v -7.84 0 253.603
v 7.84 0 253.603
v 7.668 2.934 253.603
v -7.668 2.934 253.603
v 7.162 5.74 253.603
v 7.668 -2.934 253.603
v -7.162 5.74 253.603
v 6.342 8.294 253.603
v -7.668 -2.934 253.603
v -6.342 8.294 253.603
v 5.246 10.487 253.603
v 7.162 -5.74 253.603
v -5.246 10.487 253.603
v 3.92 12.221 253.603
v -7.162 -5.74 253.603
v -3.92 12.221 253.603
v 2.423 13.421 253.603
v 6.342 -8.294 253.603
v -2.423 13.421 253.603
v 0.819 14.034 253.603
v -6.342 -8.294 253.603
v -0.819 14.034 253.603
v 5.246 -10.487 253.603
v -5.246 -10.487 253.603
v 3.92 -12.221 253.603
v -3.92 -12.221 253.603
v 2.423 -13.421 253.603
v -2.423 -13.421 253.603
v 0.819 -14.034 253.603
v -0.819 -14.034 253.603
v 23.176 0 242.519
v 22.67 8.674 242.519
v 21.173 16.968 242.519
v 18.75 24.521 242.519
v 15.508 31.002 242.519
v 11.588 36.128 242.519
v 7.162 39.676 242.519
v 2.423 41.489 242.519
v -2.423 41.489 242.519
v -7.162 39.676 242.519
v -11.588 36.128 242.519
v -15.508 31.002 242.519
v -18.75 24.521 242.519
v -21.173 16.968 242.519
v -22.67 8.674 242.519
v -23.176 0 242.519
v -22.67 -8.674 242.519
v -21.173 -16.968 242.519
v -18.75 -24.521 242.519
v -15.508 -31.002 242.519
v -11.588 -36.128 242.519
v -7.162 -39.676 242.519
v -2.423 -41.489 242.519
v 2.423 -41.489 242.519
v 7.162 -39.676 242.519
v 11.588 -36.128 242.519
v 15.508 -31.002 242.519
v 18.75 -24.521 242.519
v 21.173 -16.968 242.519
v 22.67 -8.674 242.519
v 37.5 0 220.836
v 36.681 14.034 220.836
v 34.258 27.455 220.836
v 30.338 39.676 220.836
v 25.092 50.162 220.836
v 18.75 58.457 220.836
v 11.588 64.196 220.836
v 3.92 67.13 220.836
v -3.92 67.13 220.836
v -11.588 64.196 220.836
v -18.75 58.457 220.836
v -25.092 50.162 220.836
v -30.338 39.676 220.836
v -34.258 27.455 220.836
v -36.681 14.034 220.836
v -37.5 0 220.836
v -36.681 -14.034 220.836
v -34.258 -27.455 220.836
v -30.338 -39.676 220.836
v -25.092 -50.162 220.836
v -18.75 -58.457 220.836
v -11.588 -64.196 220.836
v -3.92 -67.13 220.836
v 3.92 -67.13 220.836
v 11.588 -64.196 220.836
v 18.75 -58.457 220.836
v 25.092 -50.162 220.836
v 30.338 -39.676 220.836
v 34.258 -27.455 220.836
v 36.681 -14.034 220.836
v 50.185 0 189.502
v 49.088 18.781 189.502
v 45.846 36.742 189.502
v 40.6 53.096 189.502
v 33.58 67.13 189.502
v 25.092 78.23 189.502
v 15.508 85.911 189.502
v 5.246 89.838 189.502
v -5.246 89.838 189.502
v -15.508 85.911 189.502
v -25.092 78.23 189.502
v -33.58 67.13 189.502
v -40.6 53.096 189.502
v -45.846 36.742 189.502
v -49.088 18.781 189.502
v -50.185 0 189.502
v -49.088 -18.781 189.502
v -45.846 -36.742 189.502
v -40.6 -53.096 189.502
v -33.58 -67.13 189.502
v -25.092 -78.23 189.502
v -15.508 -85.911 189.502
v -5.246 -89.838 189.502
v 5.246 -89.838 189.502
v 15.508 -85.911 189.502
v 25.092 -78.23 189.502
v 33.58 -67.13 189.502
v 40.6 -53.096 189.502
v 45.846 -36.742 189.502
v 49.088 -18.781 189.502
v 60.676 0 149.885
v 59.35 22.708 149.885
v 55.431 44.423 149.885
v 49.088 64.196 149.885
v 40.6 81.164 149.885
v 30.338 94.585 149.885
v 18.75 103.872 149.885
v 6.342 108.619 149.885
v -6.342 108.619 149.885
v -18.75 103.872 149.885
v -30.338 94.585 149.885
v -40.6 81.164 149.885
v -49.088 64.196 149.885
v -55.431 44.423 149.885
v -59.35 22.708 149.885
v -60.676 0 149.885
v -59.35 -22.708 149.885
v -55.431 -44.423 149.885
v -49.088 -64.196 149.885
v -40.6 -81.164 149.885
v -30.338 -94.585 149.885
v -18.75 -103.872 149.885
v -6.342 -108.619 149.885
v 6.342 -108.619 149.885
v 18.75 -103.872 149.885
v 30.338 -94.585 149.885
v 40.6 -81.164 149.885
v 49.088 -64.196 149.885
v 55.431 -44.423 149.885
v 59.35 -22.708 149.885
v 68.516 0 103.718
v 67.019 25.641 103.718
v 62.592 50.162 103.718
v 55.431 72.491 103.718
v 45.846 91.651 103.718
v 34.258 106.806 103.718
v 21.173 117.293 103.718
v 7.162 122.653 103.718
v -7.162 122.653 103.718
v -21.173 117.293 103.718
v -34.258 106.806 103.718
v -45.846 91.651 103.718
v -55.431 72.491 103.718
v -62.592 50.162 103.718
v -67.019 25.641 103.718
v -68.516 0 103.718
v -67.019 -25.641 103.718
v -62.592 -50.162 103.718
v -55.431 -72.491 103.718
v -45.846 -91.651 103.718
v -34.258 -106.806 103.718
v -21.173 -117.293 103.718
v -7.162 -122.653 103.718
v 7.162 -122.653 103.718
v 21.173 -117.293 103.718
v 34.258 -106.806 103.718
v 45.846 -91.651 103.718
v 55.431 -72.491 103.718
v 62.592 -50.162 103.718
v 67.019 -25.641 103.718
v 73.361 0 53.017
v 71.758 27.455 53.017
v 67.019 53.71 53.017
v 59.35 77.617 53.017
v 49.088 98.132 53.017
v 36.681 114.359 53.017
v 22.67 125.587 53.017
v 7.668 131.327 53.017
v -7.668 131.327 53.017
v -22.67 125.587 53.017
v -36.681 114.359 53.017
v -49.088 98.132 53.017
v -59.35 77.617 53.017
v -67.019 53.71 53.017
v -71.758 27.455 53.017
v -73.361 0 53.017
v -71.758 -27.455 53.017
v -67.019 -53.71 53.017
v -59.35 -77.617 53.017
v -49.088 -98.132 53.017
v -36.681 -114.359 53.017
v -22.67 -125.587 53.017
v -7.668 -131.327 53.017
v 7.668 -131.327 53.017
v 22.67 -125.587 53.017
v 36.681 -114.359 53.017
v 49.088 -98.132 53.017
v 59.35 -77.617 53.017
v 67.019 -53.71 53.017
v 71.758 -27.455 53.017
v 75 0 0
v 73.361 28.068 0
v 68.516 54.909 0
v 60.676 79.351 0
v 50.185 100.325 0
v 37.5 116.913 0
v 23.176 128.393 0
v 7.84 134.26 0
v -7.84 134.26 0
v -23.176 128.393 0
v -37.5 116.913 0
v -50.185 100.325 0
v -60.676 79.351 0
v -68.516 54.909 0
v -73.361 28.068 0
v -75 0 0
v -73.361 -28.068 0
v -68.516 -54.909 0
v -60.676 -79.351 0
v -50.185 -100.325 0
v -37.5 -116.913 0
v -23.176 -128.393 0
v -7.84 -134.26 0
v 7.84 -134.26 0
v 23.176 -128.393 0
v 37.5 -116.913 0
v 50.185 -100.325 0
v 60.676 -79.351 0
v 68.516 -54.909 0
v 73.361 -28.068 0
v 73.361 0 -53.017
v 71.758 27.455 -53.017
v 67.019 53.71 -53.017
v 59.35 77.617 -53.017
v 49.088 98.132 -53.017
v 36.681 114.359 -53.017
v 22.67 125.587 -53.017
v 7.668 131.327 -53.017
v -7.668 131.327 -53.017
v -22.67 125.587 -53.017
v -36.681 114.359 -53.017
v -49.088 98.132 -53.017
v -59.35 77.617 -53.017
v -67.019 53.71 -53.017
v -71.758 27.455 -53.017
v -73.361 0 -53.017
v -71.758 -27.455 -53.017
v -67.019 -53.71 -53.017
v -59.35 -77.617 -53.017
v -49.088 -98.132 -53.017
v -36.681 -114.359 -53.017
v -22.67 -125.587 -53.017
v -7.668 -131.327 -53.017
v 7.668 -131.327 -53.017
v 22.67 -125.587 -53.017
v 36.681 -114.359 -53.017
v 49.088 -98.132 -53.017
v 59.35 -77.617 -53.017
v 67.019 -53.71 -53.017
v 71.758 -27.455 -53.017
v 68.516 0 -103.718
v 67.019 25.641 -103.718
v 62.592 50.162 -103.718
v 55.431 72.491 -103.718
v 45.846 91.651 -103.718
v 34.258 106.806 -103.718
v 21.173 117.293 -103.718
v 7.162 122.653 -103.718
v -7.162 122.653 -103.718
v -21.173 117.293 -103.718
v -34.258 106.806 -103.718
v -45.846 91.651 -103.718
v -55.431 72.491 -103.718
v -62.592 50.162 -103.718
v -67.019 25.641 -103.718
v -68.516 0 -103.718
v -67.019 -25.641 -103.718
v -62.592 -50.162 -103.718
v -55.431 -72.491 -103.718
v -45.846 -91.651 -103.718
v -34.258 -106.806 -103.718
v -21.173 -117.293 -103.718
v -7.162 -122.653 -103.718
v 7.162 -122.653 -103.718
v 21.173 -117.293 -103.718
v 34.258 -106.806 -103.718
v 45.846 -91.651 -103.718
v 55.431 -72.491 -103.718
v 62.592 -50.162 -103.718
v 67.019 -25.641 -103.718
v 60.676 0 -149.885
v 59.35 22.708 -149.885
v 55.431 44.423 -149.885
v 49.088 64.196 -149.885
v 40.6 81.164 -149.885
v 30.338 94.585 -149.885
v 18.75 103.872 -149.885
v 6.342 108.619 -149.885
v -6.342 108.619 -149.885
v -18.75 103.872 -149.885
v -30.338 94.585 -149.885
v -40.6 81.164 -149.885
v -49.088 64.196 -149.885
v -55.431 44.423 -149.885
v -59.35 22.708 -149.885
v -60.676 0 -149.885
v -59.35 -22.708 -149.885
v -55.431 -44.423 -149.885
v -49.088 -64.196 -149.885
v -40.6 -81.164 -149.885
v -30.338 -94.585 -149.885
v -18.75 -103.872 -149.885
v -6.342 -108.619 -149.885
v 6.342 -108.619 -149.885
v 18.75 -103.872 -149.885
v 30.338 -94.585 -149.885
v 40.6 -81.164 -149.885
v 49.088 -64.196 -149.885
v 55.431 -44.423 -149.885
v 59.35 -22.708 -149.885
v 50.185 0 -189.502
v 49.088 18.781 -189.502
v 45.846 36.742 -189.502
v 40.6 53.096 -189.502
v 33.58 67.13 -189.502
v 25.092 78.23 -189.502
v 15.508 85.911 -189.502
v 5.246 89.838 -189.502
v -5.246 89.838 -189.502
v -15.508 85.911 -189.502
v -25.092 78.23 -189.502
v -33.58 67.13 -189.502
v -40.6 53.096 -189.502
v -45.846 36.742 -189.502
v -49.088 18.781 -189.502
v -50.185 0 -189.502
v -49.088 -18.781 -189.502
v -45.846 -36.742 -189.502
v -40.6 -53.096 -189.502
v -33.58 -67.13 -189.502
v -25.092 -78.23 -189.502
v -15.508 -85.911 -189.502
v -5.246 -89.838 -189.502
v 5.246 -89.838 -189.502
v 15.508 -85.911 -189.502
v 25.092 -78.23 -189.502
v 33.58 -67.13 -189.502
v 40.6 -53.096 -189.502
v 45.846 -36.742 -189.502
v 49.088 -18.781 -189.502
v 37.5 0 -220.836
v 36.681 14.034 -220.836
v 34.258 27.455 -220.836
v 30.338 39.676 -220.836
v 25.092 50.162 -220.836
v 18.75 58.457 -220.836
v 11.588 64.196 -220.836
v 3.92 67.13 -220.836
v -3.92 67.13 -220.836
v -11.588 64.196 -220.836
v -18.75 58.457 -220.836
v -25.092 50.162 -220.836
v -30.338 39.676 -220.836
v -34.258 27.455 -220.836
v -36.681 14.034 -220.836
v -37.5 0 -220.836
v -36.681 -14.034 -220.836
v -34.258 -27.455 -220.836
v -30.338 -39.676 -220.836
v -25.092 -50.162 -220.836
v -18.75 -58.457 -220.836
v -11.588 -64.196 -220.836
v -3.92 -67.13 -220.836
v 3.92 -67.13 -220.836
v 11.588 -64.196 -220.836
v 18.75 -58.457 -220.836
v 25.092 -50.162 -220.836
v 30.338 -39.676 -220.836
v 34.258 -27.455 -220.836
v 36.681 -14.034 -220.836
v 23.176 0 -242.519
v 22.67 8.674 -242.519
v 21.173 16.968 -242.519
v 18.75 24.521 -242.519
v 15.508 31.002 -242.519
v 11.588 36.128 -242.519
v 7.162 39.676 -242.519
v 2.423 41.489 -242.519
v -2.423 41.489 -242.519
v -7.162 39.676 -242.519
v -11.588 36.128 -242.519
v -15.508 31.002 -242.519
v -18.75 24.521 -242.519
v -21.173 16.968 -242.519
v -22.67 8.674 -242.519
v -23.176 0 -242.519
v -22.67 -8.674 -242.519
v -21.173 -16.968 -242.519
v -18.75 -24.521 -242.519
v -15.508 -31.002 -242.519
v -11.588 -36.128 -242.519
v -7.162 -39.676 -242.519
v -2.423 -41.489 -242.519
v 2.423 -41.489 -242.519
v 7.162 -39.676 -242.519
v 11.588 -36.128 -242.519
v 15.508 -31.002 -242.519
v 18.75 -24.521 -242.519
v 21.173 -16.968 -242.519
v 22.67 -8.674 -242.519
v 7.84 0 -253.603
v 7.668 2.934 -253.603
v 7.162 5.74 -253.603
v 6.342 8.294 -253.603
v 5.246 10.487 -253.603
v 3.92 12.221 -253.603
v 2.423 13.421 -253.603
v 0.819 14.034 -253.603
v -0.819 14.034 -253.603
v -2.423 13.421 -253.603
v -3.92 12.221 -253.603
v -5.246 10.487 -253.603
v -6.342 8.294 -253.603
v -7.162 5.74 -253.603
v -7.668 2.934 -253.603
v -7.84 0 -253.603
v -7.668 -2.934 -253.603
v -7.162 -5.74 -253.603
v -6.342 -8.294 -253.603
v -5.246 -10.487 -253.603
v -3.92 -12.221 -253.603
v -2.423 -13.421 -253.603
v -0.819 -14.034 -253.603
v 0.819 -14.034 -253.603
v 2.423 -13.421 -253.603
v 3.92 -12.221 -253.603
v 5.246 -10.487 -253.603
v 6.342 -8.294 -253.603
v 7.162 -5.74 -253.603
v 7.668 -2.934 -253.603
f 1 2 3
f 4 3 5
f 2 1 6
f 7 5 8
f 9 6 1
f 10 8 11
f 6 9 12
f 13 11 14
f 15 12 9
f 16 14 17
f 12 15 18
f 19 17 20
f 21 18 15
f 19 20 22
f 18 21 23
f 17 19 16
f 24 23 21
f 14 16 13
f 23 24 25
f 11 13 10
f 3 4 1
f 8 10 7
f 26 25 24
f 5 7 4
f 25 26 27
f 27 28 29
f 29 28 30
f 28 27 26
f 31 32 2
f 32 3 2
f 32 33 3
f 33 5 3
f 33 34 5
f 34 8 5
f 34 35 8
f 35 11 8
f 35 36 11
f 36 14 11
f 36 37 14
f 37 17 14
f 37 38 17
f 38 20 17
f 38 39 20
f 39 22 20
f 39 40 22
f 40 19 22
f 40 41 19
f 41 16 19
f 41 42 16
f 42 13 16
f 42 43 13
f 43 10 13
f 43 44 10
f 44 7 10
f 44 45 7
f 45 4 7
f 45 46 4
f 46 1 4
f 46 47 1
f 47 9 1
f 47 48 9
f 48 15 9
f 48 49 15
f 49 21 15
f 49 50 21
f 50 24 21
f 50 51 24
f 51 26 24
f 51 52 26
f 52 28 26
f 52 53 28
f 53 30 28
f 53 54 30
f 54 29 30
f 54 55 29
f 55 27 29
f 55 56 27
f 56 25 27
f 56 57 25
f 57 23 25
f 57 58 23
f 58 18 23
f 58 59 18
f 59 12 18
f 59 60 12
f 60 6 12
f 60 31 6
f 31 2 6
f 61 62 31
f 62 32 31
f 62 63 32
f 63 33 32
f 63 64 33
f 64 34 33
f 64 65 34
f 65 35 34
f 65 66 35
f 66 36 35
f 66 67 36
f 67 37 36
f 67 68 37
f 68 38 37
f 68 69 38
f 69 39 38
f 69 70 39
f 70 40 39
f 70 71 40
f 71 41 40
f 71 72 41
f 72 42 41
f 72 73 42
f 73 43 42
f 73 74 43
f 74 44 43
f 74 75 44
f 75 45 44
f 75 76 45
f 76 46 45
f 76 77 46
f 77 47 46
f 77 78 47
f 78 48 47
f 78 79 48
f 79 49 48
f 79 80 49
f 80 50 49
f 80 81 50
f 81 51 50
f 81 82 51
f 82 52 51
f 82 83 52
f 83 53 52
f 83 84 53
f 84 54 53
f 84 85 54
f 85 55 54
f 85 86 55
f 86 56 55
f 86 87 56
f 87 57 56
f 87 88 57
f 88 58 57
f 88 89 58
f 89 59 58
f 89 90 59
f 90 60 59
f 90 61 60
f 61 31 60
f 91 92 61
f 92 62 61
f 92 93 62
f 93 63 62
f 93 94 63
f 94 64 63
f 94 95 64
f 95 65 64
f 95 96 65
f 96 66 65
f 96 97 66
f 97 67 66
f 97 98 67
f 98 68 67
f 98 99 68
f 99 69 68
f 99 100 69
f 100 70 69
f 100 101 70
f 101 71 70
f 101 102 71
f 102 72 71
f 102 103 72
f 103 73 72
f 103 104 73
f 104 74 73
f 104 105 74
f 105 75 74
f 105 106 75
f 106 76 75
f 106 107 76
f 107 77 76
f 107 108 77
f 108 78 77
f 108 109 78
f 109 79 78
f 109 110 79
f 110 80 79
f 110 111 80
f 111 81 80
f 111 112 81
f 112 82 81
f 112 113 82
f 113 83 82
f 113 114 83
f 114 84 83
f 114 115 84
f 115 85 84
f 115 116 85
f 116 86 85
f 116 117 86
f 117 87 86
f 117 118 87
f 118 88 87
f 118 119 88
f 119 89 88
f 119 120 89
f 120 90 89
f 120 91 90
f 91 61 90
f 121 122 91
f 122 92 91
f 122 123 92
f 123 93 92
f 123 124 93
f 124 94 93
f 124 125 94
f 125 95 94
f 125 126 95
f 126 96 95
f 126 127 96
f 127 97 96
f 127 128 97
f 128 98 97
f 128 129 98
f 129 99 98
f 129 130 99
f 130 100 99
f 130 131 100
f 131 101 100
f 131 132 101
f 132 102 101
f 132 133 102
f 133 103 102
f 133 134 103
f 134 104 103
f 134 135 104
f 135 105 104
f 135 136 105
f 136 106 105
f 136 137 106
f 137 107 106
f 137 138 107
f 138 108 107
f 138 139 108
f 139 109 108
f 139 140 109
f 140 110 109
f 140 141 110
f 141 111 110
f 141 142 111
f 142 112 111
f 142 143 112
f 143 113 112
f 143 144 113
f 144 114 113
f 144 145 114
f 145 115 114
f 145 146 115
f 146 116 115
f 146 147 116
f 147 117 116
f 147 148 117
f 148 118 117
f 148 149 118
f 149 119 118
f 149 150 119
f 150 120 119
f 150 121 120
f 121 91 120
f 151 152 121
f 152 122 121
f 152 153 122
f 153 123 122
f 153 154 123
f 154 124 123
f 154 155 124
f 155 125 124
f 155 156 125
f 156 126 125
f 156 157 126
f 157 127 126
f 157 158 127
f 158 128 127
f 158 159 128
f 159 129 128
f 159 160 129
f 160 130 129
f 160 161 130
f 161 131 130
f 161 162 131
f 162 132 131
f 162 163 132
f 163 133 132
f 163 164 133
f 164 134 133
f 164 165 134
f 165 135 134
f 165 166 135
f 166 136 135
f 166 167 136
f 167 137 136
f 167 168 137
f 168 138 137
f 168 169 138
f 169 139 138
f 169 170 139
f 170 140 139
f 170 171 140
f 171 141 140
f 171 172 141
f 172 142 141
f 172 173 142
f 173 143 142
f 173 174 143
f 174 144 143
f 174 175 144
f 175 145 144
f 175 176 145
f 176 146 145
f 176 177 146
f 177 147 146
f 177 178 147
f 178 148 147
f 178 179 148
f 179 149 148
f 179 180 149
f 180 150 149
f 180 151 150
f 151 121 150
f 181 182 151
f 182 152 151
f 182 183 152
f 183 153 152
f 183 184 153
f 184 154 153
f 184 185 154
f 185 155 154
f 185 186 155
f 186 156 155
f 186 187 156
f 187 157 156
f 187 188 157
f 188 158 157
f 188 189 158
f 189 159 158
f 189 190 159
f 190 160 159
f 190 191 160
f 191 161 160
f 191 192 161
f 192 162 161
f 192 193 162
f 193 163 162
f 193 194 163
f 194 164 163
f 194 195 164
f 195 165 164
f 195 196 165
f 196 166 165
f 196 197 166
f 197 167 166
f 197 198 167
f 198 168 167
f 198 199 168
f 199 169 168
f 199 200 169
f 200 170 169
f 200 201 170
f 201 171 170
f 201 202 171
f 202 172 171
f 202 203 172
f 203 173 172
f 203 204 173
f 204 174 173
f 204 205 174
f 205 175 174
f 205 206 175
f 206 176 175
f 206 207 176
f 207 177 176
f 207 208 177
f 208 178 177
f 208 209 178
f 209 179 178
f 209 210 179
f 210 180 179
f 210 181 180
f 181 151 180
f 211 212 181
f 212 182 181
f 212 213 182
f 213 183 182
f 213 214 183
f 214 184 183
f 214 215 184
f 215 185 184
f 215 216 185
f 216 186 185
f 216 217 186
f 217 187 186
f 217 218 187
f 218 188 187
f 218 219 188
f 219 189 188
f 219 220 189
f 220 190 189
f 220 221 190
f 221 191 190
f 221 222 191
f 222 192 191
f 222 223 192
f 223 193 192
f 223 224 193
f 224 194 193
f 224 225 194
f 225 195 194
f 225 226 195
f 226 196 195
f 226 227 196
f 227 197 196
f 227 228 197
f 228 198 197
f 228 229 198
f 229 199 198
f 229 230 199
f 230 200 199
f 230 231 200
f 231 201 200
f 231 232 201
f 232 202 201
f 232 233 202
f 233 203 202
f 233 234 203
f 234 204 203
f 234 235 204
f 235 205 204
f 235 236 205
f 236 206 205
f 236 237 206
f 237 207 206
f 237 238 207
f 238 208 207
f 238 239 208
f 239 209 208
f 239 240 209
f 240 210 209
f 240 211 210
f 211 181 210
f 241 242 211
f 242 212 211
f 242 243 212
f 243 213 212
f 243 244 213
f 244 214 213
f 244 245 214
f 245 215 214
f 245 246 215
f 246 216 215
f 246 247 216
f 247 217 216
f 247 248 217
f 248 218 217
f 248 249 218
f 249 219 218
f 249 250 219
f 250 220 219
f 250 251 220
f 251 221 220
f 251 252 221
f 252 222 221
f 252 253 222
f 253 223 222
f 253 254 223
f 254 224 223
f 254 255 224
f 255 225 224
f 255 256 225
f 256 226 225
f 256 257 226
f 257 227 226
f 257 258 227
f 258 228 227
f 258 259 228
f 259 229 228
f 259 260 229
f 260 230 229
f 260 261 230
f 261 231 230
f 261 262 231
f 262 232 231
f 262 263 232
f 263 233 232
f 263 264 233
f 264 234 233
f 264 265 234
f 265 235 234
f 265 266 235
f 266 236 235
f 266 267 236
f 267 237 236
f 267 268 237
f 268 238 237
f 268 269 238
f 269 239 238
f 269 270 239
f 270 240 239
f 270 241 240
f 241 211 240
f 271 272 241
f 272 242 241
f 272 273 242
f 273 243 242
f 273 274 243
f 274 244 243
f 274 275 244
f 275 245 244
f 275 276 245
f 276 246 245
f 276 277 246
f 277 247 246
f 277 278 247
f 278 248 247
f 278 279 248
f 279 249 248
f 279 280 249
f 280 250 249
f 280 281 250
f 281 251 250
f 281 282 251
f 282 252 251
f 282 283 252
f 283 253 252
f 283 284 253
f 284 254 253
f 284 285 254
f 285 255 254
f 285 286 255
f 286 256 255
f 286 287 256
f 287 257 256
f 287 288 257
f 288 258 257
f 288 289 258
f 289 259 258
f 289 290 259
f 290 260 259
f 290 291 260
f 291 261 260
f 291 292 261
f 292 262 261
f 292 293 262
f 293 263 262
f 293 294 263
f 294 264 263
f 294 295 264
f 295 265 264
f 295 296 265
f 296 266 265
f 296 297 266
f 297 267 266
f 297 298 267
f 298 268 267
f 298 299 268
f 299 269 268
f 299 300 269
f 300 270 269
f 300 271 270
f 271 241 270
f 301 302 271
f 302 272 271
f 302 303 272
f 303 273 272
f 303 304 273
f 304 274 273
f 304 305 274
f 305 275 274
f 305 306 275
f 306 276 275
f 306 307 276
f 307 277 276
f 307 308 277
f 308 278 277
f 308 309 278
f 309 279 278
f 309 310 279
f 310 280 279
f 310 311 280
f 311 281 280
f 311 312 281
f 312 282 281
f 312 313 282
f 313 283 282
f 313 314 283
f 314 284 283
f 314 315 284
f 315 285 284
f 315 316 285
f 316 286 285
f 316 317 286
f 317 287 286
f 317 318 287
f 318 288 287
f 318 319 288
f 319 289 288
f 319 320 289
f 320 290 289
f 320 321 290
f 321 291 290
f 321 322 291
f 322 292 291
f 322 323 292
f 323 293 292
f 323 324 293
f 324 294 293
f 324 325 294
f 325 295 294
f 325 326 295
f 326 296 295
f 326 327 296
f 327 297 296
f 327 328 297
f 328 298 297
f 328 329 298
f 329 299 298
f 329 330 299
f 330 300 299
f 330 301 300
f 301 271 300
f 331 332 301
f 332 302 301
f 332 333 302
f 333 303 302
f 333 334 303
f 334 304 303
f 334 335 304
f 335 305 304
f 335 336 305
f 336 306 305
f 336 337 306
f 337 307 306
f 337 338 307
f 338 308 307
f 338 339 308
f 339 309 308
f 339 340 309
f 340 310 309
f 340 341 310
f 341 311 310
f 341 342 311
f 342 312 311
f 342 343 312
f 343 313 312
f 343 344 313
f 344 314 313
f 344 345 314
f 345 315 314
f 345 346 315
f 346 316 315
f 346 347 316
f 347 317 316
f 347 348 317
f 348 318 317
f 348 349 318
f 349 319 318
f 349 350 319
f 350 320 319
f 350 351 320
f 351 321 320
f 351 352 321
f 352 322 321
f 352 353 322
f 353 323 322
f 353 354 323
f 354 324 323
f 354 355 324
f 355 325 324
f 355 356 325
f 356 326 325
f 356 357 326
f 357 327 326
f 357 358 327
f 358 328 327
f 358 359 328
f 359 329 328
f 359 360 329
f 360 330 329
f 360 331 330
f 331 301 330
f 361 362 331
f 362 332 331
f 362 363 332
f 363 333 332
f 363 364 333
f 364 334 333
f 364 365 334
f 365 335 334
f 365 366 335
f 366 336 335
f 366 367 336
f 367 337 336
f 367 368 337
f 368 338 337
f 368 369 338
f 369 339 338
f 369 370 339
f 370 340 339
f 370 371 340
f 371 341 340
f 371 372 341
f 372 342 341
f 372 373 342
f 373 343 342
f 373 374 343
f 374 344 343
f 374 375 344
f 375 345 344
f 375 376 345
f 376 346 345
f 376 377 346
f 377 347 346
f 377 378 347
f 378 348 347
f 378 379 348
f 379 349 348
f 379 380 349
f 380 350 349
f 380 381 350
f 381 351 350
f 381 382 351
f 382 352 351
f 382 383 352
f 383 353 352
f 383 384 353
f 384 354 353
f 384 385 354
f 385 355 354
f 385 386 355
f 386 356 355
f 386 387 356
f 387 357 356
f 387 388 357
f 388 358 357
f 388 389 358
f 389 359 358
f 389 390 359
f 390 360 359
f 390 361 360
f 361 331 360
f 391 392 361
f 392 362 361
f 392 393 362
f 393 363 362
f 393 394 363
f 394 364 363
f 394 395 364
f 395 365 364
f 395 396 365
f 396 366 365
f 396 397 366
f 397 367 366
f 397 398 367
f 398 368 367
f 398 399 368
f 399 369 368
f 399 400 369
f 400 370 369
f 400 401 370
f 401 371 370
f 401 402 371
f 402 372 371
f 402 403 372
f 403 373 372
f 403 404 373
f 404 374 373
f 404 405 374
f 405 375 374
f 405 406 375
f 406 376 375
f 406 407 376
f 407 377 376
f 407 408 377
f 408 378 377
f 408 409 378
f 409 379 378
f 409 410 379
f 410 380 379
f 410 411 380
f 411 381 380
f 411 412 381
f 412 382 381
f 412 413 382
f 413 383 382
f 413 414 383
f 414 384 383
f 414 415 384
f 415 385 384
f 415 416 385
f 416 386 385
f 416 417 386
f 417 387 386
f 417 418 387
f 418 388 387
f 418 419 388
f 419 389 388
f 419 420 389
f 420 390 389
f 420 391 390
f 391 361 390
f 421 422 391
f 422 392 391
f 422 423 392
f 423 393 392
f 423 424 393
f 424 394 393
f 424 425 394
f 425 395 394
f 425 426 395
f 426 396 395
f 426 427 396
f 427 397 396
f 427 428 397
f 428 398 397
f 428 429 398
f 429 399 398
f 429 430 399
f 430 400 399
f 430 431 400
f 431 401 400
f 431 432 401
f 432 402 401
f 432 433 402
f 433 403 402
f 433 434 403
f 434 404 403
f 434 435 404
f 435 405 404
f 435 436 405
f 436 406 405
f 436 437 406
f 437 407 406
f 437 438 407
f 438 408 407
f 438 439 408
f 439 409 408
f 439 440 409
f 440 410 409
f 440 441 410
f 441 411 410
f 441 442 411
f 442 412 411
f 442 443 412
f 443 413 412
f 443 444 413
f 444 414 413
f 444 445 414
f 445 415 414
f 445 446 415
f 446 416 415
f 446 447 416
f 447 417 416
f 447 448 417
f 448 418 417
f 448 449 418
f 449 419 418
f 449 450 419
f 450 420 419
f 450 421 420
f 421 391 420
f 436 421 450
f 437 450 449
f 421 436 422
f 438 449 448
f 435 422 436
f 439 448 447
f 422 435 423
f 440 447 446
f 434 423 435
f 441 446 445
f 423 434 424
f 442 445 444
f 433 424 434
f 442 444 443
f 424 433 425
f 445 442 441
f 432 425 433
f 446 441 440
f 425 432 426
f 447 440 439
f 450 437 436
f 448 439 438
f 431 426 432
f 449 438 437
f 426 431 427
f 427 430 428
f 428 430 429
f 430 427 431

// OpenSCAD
// Generated by SolidPython 1.0.1 on 2020-07-29 00:46:46


scale(v = [5, 9, 17]) {
	sphere(r = 15);
}
/***********************************************
*********      SolidPython code:      **********
************************************************
 
# import packages: SolidPython
from solid import *
from solid.utils import *
from itertools import chain, combinations, permutations


class Resize:

    def __init__(self, scad_file):
        self.scad_file = scad_file
        #self.scad_file = import_scad(scad_file)
        # cone/cylinder param:
        self.r1 = 0
        self.r2 = 0
        self.h = 0
        # rectangular prism param:
        self.w = 0
        self.l = 0
        # ellipse param:
        self.r = 0

    # import OpenScad code (file name corresponds to shape)


    # classify shape + parameters
    def assign(self, param1, param2, param3):
        if self.scad_file == 'cone.scad':
            self.r1 = param1
            self.r2 = param2
            self.h = param3
        elif self.scad_file == 'cylinder.scad':
            self.r1 = param1
            self.r2 = param2
            self.h = param3
        elif self.scad_file == 'rectangularPrism.scad':
            self.h = param1
            self.l = param2
            self.w = param3
        else:
            self.r = param1
            self.h = param2

    # resize parameters
    def iterate(self):
        x = range(3, 20, 2)
        i = 1
        if self.scad_file == 'cone.scad':
            tempList = list(permutations(x, 2))
            for temp in tempList:
                param1 = temp[0]
                param2 = temp[1]
                filepath = 'produced_scad_files/' + 'cone' + str(param1) + '_' + str(param2) + '_' + '.scad'
                scad_render_to_file(cylinder(h=param1, r1=param2, r2=0), filepath)

        elif self.scad_file == 'cylinder.scad':
            tempList = list(permutations(x, 3))
            for temp in tempList:
                param1 = temp[0]
                param2 = temp[1]
                filepath = 'produced_scad_files/' + 'cylinder' + str(param1) + '_' + str(param2) + '_' + '.scad'
                scad_render_to_file(cylinder(h=param1, r1=param2, r2=param2), filepath)

        elif self.scad_file == 'rectangularPrism.scad':
            tempList = list(permutations(x, 3))
            for temp in tempList:
                param1 = temp[0]
                param2 = temp[1]
                param3 = temp[2]
                filepath = 'produced_scad_files/' + 'rectangularPrism' + str(param1) + '_' + str(param2) + '_' + str(
                    param3) + '.scad'
                scad_render_to_file(cube(size=(param1, param2, param3)), filepath)

        elif self.scad_file == 'ellipse.scad':
            tempList = list(permutations(x, 4))
            for temp in tempList:
                param1 = temp[0]
                param2 = temp[1]
                param3 = temp[2]
                param4 = temp[3]
                filepath = 'produced_scad_files/' + 'ellipse' + str(param1) + '_' + str(param2) + '_' + str(param3) + '_' + str(param4) + '.scad'
                scad_render_to_file(scale([param1, param2, param3])(sphere(r=param4)), filepath)

    def render_to_scadfile(self):
        scad_render_to_file(scad, 'example.scad') 
 
************************************************/
